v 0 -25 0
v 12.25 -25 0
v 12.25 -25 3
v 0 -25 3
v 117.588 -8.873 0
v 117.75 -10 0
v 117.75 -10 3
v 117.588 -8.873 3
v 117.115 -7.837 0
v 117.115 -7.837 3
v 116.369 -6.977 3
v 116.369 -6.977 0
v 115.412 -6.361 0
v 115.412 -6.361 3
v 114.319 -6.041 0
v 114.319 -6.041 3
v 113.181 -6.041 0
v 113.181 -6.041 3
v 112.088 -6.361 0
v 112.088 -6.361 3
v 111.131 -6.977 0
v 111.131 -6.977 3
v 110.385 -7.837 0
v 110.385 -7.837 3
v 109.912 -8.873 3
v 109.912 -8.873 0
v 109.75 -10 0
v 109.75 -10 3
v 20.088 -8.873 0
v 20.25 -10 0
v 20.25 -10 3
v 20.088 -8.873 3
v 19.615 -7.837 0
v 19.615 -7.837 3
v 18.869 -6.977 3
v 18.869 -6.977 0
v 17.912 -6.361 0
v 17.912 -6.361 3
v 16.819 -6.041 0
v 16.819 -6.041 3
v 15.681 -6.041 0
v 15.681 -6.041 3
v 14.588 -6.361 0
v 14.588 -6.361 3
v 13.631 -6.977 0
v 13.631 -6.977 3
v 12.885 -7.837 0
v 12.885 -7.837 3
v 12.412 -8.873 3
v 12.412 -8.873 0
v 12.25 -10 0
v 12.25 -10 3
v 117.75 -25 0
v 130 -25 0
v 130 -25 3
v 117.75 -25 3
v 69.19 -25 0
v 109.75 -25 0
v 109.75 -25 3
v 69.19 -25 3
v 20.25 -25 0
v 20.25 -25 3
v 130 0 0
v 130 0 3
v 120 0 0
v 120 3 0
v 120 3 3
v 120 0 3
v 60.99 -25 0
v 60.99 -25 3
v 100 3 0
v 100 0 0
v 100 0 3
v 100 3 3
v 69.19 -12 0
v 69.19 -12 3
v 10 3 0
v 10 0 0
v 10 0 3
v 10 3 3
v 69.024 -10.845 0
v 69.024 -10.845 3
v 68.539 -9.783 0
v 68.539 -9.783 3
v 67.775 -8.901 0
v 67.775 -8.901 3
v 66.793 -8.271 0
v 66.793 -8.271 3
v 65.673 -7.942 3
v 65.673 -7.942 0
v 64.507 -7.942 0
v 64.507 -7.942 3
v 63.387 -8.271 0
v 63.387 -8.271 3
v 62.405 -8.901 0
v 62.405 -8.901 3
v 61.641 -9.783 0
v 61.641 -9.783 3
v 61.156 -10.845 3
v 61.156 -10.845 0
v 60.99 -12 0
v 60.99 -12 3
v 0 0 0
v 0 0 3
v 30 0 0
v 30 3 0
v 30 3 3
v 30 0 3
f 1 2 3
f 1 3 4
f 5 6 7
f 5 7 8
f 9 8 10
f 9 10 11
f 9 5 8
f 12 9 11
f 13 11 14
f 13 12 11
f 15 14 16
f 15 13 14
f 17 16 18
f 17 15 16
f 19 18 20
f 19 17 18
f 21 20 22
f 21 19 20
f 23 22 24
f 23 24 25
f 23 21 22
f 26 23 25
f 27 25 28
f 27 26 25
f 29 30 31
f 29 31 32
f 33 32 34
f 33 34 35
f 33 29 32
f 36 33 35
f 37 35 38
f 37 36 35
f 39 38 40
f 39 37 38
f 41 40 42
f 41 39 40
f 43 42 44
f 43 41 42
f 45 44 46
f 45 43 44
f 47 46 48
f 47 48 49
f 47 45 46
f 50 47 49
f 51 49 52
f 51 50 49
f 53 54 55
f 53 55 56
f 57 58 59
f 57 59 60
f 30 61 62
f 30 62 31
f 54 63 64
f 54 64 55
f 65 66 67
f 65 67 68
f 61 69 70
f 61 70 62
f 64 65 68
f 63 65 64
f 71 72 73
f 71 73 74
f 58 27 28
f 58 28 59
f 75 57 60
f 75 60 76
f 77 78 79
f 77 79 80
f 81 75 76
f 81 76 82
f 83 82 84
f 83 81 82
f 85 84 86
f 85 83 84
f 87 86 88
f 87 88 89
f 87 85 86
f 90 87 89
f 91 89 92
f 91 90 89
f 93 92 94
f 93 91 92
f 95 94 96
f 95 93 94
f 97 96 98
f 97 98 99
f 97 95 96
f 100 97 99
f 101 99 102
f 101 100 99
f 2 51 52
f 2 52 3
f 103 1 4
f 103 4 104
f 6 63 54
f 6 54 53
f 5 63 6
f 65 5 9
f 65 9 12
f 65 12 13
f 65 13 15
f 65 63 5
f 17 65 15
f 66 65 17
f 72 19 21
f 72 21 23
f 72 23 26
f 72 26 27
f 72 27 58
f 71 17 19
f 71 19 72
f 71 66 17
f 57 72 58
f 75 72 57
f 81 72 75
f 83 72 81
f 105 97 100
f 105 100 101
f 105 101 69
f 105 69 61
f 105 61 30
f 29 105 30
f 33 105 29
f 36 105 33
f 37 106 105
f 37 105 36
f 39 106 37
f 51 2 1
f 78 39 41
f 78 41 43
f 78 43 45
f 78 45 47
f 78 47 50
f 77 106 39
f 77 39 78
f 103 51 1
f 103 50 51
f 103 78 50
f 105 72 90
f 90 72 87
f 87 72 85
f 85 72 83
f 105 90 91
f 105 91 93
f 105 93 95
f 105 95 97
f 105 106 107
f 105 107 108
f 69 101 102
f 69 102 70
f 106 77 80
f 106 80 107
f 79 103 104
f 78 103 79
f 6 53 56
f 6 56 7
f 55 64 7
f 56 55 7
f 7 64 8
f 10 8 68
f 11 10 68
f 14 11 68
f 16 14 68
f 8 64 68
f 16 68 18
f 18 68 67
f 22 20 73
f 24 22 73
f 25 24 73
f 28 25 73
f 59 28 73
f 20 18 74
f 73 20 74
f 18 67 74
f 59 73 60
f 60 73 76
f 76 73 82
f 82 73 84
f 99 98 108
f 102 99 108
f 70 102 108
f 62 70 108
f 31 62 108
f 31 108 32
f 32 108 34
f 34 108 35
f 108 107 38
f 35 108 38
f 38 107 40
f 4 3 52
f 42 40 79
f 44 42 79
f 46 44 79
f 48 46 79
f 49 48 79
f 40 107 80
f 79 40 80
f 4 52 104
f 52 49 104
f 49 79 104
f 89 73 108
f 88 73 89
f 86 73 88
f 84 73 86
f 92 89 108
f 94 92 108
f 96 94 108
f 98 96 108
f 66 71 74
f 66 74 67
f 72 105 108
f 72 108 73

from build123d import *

# Parameters (mm, degrees)
BOSS_EXTRUDE1_DEPTH = 3


with BuildPart() as part:
    # Sketch1 → Boss-Extrude1 (new body)
    with BuildSketch(Plane.XY):
        with BuildLine():
            Line((0, 0), (10, 0))
            Line((10, 0), (10, 3))
            Line((10, 3), (30, 3))
            Line((30, 3), (30, 0))
            Line((30, 0), (100, 0))
            Line((100, 0), (100, 3))
            Line((100, 3), (120, 3))
            Line((120, 3), (120, 0))
            Line((120, 0), (130, 0))
            Line((130, 0), (130, -25))
            Line((130, -25), (117.75, -25))
            Line((117.75, -25), (117.75, -10))
            ThreePointArc((117.75, -10), (113.75, -6), (109.75, -10))
            Line((109.75, -10), (109.75, -25))
            Line((109.75, -25), (69.19, -25))
            Line((69.19, -25), (69.19, -12))
            ThreePointArc((69.19, -12), (65.09, -7.9), (60.99, -12))
            Line((60.99, -12), (60.99, -25))
            Line((60.99, -25), (20.25, -25))
            Line((20.25, -25), (20.25, -10))
            ThreePointArc((20.25, -10), (16.25, -6), (12.25, -10))
            Line((12.25, -10), (12.25, -25))
            Line((12.25, -25), (0, -25))
            Line((0, -25), (0, 0))
        make_face()
    extrude(amount=BOSS_EXTRUDE1_DEPTH)


solid = part.part
